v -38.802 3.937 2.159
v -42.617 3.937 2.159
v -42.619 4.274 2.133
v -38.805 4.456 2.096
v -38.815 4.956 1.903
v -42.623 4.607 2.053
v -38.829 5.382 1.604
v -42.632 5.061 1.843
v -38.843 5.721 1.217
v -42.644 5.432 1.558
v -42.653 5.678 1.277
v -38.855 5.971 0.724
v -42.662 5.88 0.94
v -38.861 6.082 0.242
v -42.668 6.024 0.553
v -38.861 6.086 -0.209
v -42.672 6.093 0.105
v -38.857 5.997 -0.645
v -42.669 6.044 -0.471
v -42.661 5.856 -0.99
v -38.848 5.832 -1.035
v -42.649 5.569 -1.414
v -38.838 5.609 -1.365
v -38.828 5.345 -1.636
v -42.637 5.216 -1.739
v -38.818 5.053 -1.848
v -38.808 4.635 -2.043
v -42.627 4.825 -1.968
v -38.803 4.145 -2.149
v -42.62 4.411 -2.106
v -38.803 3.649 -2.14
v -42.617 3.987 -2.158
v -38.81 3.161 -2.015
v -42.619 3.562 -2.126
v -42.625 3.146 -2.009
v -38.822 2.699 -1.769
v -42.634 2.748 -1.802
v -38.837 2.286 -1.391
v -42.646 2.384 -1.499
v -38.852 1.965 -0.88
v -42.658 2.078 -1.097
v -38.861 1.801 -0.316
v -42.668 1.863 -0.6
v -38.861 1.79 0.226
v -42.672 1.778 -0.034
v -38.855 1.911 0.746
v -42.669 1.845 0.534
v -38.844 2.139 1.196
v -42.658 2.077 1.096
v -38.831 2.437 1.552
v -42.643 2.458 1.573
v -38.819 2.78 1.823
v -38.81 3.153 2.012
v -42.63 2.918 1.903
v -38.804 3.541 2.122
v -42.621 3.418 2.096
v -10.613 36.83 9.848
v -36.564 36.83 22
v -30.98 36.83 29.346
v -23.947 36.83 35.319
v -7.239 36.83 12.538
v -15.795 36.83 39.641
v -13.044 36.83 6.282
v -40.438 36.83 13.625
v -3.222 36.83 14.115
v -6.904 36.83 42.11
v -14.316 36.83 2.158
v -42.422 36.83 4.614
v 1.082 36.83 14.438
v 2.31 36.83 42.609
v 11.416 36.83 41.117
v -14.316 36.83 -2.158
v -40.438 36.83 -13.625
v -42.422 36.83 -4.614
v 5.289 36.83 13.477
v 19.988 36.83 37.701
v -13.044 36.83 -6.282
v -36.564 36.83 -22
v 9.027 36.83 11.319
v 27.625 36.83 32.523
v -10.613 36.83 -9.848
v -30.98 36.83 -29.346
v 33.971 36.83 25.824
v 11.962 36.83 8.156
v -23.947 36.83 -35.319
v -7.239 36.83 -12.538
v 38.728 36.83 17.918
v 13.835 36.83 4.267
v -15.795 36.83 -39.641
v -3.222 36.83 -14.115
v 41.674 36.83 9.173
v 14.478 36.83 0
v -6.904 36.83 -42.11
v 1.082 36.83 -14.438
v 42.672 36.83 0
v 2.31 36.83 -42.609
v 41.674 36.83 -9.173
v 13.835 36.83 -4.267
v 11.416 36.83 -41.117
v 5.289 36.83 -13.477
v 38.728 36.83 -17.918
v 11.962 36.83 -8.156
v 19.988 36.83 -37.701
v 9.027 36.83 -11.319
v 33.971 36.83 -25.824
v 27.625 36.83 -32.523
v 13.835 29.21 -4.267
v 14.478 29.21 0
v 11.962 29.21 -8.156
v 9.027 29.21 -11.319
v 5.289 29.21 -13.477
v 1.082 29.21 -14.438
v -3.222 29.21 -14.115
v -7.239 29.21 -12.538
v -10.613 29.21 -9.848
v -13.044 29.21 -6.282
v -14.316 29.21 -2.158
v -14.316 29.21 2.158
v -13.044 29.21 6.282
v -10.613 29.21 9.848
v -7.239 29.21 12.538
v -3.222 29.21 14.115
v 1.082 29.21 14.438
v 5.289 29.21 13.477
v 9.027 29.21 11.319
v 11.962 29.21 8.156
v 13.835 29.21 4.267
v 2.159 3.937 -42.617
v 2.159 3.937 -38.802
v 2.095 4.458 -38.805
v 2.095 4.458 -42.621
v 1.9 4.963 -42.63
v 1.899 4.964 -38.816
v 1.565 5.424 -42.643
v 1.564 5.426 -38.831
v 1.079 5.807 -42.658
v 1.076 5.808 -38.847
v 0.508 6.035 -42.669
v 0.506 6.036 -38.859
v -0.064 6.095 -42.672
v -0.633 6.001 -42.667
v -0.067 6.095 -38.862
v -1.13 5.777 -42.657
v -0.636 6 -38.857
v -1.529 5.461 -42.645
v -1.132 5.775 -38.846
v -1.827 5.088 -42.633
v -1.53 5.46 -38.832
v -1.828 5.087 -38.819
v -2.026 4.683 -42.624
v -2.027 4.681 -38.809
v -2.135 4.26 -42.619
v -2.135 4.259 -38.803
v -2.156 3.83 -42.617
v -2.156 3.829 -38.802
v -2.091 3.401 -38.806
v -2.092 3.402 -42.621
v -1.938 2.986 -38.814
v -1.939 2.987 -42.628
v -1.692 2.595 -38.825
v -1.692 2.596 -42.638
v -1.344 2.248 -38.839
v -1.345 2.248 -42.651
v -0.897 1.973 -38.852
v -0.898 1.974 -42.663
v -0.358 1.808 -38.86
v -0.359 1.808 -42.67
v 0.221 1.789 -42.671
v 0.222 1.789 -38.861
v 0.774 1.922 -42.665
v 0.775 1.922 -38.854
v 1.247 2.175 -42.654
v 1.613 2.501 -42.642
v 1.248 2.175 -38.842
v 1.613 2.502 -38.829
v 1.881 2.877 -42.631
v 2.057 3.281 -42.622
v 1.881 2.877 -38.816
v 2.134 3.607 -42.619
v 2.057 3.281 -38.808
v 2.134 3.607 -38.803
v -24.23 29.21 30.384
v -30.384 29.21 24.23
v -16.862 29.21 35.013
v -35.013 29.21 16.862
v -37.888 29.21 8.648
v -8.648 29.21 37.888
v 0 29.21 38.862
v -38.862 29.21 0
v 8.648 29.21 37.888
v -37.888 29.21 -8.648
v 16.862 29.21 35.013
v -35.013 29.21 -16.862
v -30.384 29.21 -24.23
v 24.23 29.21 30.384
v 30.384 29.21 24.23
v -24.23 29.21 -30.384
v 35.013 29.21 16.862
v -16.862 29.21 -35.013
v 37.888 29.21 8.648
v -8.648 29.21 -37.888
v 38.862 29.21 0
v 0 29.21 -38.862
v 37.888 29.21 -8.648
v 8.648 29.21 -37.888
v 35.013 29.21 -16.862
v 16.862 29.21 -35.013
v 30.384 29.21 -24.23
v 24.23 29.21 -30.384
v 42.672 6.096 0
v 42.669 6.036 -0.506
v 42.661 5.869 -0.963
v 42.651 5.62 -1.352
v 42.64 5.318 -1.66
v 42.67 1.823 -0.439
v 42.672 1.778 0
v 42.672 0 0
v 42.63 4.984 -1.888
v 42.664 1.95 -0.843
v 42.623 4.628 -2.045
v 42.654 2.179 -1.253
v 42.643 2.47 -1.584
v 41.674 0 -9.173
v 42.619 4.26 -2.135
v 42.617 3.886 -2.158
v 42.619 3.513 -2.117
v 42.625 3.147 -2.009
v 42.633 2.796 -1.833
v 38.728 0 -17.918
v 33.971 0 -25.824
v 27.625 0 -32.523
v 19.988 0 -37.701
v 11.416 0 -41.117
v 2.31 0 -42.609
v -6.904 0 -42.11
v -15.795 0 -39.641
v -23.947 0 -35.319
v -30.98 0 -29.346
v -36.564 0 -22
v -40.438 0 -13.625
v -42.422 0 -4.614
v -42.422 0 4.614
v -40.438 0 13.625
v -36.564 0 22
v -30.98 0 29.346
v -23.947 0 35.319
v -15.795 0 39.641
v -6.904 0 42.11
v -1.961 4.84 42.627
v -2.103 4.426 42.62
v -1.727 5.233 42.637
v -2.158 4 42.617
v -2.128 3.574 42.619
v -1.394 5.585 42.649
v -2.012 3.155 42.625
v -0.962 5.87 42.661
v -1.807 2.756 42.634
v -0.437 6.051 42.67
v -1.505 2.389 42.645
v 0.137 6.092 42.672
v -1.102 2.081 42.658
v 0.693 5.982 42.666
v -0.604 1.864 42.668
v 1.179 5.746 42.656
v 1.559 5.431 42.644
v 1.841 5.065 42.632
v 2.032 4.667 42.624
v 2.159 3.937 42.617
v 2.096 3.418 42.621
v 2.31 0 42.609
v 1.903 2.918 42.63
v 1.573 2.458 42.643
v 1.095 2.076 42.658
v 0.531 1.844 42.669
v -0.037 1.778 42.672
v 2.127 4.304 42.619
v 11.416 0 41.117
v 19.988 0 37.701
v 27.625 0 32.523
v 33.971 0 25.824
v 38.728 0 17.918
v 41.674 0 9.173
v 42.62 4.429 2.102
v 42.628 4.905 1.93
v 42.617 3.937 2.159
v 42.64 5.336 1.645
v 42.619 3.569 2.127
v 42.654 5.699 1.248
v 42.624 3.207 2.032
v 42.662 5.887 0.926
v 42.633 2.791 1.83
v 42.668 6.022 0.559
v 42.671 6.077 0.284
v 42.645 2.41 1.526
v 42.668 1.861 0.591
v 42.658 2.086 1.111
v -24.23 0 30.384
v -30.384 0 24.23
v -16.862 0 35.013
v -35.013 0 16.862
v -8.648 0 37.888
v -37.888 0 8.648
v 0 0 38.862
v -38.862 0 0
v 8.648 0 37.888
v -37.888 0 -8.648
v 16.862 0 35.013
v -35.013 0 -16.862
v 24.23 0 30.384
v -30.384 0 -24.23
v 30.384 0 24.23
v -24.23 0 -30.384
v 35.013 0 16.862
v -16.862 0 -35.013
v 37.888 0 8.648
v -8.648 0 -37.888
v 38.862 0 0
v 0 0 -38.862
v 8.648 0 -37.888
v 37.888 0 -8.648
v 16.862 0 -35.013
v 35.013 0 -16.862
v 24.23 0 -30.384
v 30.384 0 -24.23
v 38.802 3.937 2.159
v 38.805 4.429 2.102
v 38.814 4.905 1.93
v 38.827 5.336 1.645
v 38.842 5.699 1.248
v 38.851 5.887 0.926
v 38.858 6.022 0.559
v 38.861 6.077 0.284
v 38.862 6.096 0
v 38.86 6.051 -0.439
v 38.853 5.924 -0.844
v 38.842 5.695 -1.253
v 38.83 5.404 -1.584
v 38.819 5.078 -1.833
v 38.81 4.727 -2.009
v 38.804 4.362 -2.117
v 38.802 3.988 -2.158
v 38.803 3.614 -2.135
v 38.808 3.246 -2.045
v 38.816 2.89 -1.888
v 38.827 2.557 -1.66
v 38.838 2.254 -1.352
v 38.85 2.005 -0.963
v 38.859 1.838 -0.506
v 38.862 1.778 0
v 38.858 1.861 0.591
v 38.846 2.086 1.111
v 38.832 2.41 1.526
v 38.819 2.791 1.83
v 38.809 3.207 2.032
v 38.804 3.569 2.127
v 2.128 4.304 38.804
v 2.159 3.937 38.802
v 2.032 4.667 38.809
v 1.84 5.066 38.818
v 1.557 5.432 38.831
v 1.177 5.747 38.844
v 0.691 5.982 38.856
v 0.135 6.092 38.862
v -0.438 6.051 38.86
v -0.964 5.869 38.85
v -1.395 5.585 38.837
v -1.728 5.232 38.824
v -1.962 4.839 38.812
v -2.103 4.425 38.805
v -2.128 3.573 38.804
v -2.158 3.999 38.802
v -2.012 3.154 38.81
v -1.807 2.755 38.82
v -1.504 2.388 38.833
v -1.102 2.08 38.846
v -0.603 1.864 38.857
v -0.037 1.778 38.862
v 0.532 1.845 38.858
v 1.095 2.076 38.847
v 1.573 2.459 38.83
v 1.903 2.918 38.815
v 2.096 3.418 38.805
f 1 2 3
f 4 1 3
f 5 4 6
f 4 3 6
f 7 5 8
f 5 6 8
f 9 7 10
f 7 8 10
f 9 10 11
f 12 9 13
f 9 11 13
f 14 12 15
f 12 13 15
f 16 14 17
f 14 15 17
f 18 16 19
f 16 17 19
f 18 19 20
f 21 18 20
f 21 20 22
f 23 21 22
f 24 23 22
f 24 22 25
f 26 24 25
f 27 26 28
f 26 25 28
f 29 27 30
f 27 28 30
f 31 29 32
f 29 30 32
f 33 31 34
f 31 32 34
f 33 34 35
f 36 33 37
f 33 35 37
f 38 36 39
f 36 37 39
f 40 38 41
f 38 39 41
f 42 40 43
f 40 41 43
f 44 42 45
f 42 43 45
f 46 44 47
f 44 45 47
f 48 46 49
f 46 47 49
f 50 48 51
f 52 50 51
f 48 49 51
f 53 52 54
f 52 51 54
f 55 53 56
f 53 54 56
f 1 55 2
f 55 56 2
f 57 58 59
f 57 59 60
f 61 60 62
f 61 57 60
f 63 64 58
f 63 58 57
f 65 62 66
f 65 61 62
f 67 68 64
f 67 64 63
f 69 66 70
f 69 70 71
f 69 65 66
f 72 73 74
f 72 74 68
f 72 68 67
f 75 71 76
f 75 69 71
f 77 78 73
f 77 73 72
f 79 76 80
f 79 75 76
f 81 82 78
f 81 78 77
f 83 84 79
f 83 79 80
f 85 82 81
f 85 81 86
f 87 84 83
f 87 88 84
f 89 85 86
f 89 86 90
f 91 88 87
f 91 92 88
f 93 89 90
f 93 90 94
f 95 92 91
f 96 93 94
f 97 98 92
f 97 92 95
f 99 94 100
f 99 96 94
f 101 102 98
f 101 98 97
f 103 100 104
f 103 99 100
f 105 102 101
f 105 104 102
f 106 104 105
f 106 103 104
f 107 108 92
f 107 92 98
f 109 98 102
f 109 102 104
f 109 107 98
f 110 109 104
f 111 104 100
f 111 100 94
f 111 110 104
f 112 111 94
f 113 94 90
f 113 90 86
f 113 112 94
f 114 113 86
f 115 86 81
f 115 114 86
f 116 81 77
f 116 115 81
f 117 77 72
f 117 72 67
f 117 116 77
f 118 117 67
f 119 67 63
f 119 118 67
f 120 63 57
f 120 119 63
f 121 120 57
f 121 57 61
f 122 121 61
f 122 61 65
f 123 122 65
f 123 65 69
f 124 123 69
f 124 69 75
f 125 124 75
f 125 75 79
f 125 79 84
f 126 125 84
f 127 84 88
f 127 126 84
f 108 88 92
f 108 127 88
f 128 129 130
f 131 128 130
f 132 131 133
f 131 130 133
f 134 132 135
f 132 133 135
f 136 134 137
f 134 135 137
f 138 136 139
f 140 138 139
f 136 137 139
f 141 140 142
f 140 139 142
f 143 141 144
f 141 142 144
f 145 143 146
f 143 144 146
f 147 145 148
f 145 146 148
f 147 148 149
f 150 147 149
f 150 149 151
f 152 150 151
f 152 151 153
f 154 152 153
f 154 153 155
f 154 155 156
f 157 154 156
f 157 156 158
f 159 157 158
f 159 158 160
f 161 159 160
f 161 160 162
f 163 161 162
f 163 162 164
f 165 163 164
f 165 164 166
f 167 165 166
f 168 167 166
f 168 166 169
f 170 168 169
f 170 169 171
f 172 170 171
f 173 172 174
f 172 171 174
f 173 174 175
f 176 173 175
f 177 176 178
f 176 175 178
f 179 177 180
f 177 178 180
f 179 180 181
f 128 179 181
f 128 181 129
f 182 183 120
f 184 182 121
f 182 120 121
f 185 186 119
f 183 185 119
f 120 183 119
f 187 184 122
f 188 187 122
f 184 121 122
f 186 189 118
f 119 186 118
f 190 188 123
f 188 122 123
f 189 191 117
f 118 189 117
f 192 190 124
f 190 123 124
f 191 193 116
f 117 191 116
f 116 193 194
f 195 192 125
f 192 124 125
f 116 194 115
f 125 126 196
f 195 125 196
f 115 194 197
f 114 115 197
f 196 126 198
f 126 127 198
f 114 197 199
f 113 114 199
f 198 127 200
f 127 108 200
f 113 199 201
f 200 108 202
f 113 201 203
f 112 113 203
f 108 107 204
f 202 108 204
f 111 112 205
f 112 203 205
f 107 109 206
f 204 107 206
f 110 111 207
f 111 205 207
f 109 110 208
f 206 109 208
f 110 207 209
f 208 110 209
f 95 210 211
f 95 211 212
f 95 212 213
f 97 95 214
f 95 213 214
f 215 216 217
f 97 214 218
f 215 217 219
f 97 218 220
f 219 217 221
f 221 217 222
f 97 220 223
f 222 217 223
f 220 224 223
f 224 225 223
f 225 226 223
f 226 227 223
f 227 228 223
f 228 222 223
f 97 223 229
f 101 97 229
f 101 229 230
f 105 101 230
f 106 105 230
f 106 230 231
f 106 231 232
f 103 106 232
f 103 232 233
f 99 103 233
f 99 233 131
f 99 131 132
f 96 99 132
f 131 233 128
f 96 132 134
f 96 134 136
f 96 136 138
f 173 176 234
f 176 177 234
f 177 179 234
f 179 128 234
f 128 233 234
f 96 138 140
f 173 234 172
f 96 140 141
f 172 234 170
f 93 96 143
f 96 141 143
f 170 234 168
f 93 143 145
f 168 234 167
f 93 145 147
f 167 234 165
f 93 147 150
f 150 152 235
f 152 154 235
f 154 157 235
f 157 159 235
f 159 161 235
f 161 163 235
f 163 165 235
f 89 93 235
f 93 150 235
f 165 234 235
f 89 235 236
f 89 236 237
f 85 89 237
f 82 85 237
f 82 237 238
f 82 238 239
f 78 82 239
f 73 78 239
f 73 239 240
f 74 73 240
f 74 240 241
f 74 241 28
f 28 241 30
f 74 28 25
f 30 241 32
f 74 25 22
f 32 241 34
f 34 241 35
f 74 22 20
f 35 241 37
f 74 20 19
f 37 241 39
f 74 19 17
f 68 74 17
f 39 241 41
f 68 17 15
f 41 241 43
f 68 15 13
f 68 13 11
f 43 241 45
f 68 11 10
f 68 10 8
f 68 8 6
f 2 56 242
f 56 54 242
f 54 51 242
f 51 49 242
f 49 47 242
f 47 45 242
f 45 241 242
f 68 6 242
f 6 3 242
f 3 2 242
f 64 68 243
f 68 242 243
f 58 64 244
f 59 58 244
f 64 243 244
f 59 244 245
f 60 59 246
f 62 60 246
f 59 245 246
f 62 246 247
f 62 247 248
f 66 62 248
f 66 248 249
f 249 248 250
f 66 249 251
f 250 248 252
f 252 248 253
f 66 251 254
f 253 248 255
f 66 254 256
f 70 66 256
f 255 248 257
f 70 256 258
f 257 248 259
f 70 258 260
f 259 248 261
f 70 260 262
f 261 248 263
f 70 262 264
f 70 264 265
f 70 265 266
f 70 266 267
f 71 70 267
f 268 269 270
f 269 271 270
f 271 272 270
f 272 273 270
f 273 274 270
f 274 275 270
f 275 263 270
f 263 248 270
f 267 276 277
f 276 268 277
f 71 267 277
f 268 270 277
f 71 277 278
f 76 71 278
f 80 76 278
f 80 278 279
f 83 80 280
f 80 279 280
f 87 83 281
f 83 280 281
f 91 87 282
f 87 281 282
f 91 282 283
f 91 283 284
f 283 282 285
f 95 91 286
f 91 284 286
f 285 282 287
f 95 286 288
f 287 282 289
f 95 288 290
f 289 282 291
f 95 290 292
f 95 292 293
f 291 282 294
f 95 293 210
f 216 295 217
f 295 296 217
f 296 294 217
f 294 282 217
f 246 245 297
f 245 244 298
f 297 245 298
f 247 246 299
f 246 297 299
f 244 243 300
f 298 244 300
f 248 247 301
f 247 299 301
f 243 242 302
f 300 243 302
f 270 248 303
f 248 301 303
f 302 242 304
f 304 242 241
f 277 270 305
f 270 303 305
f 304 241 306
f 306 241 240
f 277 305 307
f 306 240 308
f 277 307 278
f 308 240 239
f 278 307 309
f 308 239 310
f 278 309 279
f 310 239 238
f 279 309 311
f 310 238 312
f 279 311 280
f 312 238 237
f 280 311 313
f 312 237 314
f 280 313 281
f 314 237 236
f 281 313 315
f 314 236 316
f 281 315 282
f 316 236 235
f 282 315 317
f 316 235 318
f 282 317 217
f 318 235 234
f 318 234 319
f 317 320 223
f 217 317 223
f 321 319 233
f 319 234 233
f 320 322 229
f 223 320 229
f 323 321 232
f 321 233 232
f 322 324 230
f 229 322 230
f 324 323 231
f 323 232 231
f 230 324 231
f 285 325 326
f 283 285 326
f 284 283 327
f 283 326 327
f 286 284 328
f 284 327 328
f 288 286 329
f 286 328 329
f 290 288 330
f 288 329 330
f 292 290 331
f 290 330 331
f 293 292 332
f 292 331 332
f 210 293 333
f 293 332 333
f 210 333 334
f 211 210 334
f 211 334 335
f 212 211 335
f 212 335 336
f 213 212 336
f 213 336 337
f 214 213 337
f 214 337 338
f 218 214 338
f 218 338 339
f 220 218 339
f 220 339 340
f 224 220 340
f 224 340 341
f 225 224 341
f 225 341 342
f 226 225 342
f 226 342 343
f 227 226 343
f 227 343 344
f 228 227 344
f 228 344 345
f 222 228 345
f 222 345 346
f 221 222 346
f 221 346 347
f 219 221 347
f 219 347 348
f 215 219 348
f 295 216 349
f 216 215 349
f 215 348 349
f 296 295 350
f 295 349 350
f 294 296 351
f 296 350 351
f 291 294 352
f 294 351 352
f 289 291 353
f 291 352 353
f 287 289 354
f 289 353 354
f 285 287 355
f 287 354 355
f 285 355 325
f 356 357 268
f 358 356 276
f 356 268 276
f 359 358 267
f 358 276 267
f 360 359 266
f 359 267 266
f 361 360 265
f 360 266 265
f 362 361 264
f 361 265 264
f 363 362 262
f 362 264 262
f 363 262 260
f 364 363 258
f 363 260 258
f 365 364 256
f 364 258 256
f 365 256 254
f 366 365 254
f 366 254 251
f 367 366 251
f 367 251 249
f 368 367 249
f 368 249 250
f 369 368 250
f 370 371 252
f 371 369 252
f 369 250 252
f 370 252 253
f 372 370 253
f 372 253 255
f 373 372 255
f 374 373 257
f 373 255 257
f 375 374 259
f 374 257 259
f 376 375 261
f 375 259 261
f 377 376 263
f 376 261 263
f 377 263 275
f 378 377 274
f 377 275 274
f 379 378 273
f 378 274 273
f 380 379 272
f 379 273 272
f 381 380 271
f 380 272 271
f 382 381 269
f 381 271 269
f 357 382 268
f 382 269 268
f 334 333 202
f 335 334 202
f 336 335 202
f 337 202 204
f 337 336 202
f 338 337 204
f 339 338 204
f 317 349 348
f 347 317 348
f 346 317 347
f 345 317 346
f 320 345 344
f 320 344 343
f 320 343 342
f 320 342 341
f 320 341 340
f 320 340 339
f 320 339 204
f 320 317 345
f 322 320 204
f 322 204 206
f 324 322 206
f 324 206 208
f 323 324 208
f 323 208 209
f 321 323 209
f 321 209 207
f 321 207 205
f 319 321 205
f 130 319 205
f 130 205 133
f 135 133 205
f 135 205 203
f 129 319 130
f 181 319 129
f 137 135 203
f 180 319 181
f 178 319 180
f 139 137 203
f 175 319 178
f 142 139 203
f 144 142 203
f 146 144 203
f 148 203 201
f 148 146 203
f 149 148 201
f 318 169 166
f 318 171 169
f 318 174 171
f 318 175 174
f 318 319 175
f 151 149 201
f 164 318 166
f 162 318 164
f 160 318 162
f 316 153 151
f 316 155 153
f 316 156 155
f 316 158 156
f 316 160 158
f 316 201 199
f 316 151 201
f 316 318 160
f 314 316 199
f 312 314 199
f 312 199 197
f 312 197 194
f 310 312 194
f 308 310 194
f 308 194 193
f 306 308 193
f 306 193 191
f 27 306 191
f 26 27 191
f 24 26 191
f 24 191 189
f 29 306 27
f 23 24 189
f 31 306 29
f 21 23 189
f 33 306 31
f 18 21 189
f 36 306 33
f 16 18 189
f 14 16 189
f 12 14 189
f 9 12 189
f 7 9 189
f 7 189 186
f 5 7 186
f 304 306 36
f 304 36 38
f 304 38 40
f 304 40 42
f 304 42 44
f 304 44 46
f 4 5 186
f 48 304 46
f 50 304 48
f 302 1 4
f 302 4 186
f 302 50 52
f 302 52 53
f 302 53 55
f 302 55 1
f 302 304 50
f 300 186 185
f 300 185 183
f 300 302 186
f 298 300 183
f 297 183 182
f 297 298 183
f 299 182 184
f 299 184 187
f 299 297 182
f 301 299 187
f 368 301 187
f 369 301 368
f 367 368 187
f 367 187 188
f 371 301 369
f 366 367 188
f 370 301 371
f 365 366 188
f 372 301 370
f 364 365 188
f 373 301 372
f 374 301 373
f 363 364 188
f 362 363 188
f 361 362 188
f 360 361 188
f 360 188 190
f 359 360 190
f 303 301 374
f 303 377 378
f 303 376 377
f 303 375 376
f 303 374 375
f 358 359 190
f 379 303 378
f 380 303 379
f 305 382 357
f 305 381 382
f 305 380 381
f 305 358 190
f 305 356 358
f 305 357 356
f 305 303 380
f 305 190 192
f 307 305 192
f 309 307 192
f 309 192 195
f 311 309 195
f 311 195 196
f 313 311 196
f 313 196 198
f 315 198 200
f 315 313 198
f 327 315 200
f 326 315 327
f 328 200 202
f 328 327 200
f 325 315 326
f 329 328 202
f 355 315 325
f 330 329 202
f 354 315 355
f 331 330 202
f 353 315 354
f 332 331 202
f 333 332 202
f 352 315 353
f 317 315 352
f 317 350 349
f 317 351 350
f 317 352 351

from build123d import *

# Parameters (mm, degrees)
SKETCH1_R           = 42.672
SKETCH1_R_2         = 38.862
BOSS_EXTRUDE1_DEPTH = 29.21
SKETCH2_R           = 42.672
SKETCH2_R_2         = 14.478
BOSS_EXTRUDE2_DEPTH = 7.62
SKETCH3_R           = 2.159
CUT_EXTRUDE1_DEPTH  = 43.672
CIRPATTERN1_COUNT   = 4


with BuildPart() as part:
    # Sketch1 → Boss-Extrude1 (new body)
    with BuildSketch(Plane(origin=(0, 0, 0), x_dir=(1, 0, 0), z_dir=(0, 1, 0))):
        Circle(SKETCH1_R)
        Circle(SKETCH1_R_2, mode=Mode.SUBTRACT)
    extrude(amount=BOSS_EXTRUDE1_DEPTH)

    # Sketch2 → Boss-Extrude2 (add)
    with BuildSketch(Plane(origin=(0, 29.21, 0), x_dir=(1, 0, 0), z_dir=(0, 1, 0))):
        Circle(SKETCH2_R)
        Circle(SKETCH2_R_2, mode=Mode.SUBTRACT)
    extrude(amount=BOSS_EXTRUDE2_DEPTH)

    # Sketch3 → Cut-Extrude1 (cut, symmetric)
    with BuildSketch(Plane.XY):
        with Locations((0, 3.937)):
            Circle(SKETCH3_R)
    cut_extrude1 = extrude(amount=CUT_EXTRUDE1_DEPTH, both=True, mode=Mode.SUBTRACT)

    # CirPattern1: Cut-Extrude1 ×4 about axis
    cirpattern1_axis = Axis((0, 29.21, 0), (0, -1, 0))
    for i in range(1, CIRPATTERN1_COUNT):
        add(cut_extrude1.rotate(cirpattern1_axis, i * 360 / CIRPATTERN1_COUNT), mode=Mode.SUBTRACT)


solid = part.part
